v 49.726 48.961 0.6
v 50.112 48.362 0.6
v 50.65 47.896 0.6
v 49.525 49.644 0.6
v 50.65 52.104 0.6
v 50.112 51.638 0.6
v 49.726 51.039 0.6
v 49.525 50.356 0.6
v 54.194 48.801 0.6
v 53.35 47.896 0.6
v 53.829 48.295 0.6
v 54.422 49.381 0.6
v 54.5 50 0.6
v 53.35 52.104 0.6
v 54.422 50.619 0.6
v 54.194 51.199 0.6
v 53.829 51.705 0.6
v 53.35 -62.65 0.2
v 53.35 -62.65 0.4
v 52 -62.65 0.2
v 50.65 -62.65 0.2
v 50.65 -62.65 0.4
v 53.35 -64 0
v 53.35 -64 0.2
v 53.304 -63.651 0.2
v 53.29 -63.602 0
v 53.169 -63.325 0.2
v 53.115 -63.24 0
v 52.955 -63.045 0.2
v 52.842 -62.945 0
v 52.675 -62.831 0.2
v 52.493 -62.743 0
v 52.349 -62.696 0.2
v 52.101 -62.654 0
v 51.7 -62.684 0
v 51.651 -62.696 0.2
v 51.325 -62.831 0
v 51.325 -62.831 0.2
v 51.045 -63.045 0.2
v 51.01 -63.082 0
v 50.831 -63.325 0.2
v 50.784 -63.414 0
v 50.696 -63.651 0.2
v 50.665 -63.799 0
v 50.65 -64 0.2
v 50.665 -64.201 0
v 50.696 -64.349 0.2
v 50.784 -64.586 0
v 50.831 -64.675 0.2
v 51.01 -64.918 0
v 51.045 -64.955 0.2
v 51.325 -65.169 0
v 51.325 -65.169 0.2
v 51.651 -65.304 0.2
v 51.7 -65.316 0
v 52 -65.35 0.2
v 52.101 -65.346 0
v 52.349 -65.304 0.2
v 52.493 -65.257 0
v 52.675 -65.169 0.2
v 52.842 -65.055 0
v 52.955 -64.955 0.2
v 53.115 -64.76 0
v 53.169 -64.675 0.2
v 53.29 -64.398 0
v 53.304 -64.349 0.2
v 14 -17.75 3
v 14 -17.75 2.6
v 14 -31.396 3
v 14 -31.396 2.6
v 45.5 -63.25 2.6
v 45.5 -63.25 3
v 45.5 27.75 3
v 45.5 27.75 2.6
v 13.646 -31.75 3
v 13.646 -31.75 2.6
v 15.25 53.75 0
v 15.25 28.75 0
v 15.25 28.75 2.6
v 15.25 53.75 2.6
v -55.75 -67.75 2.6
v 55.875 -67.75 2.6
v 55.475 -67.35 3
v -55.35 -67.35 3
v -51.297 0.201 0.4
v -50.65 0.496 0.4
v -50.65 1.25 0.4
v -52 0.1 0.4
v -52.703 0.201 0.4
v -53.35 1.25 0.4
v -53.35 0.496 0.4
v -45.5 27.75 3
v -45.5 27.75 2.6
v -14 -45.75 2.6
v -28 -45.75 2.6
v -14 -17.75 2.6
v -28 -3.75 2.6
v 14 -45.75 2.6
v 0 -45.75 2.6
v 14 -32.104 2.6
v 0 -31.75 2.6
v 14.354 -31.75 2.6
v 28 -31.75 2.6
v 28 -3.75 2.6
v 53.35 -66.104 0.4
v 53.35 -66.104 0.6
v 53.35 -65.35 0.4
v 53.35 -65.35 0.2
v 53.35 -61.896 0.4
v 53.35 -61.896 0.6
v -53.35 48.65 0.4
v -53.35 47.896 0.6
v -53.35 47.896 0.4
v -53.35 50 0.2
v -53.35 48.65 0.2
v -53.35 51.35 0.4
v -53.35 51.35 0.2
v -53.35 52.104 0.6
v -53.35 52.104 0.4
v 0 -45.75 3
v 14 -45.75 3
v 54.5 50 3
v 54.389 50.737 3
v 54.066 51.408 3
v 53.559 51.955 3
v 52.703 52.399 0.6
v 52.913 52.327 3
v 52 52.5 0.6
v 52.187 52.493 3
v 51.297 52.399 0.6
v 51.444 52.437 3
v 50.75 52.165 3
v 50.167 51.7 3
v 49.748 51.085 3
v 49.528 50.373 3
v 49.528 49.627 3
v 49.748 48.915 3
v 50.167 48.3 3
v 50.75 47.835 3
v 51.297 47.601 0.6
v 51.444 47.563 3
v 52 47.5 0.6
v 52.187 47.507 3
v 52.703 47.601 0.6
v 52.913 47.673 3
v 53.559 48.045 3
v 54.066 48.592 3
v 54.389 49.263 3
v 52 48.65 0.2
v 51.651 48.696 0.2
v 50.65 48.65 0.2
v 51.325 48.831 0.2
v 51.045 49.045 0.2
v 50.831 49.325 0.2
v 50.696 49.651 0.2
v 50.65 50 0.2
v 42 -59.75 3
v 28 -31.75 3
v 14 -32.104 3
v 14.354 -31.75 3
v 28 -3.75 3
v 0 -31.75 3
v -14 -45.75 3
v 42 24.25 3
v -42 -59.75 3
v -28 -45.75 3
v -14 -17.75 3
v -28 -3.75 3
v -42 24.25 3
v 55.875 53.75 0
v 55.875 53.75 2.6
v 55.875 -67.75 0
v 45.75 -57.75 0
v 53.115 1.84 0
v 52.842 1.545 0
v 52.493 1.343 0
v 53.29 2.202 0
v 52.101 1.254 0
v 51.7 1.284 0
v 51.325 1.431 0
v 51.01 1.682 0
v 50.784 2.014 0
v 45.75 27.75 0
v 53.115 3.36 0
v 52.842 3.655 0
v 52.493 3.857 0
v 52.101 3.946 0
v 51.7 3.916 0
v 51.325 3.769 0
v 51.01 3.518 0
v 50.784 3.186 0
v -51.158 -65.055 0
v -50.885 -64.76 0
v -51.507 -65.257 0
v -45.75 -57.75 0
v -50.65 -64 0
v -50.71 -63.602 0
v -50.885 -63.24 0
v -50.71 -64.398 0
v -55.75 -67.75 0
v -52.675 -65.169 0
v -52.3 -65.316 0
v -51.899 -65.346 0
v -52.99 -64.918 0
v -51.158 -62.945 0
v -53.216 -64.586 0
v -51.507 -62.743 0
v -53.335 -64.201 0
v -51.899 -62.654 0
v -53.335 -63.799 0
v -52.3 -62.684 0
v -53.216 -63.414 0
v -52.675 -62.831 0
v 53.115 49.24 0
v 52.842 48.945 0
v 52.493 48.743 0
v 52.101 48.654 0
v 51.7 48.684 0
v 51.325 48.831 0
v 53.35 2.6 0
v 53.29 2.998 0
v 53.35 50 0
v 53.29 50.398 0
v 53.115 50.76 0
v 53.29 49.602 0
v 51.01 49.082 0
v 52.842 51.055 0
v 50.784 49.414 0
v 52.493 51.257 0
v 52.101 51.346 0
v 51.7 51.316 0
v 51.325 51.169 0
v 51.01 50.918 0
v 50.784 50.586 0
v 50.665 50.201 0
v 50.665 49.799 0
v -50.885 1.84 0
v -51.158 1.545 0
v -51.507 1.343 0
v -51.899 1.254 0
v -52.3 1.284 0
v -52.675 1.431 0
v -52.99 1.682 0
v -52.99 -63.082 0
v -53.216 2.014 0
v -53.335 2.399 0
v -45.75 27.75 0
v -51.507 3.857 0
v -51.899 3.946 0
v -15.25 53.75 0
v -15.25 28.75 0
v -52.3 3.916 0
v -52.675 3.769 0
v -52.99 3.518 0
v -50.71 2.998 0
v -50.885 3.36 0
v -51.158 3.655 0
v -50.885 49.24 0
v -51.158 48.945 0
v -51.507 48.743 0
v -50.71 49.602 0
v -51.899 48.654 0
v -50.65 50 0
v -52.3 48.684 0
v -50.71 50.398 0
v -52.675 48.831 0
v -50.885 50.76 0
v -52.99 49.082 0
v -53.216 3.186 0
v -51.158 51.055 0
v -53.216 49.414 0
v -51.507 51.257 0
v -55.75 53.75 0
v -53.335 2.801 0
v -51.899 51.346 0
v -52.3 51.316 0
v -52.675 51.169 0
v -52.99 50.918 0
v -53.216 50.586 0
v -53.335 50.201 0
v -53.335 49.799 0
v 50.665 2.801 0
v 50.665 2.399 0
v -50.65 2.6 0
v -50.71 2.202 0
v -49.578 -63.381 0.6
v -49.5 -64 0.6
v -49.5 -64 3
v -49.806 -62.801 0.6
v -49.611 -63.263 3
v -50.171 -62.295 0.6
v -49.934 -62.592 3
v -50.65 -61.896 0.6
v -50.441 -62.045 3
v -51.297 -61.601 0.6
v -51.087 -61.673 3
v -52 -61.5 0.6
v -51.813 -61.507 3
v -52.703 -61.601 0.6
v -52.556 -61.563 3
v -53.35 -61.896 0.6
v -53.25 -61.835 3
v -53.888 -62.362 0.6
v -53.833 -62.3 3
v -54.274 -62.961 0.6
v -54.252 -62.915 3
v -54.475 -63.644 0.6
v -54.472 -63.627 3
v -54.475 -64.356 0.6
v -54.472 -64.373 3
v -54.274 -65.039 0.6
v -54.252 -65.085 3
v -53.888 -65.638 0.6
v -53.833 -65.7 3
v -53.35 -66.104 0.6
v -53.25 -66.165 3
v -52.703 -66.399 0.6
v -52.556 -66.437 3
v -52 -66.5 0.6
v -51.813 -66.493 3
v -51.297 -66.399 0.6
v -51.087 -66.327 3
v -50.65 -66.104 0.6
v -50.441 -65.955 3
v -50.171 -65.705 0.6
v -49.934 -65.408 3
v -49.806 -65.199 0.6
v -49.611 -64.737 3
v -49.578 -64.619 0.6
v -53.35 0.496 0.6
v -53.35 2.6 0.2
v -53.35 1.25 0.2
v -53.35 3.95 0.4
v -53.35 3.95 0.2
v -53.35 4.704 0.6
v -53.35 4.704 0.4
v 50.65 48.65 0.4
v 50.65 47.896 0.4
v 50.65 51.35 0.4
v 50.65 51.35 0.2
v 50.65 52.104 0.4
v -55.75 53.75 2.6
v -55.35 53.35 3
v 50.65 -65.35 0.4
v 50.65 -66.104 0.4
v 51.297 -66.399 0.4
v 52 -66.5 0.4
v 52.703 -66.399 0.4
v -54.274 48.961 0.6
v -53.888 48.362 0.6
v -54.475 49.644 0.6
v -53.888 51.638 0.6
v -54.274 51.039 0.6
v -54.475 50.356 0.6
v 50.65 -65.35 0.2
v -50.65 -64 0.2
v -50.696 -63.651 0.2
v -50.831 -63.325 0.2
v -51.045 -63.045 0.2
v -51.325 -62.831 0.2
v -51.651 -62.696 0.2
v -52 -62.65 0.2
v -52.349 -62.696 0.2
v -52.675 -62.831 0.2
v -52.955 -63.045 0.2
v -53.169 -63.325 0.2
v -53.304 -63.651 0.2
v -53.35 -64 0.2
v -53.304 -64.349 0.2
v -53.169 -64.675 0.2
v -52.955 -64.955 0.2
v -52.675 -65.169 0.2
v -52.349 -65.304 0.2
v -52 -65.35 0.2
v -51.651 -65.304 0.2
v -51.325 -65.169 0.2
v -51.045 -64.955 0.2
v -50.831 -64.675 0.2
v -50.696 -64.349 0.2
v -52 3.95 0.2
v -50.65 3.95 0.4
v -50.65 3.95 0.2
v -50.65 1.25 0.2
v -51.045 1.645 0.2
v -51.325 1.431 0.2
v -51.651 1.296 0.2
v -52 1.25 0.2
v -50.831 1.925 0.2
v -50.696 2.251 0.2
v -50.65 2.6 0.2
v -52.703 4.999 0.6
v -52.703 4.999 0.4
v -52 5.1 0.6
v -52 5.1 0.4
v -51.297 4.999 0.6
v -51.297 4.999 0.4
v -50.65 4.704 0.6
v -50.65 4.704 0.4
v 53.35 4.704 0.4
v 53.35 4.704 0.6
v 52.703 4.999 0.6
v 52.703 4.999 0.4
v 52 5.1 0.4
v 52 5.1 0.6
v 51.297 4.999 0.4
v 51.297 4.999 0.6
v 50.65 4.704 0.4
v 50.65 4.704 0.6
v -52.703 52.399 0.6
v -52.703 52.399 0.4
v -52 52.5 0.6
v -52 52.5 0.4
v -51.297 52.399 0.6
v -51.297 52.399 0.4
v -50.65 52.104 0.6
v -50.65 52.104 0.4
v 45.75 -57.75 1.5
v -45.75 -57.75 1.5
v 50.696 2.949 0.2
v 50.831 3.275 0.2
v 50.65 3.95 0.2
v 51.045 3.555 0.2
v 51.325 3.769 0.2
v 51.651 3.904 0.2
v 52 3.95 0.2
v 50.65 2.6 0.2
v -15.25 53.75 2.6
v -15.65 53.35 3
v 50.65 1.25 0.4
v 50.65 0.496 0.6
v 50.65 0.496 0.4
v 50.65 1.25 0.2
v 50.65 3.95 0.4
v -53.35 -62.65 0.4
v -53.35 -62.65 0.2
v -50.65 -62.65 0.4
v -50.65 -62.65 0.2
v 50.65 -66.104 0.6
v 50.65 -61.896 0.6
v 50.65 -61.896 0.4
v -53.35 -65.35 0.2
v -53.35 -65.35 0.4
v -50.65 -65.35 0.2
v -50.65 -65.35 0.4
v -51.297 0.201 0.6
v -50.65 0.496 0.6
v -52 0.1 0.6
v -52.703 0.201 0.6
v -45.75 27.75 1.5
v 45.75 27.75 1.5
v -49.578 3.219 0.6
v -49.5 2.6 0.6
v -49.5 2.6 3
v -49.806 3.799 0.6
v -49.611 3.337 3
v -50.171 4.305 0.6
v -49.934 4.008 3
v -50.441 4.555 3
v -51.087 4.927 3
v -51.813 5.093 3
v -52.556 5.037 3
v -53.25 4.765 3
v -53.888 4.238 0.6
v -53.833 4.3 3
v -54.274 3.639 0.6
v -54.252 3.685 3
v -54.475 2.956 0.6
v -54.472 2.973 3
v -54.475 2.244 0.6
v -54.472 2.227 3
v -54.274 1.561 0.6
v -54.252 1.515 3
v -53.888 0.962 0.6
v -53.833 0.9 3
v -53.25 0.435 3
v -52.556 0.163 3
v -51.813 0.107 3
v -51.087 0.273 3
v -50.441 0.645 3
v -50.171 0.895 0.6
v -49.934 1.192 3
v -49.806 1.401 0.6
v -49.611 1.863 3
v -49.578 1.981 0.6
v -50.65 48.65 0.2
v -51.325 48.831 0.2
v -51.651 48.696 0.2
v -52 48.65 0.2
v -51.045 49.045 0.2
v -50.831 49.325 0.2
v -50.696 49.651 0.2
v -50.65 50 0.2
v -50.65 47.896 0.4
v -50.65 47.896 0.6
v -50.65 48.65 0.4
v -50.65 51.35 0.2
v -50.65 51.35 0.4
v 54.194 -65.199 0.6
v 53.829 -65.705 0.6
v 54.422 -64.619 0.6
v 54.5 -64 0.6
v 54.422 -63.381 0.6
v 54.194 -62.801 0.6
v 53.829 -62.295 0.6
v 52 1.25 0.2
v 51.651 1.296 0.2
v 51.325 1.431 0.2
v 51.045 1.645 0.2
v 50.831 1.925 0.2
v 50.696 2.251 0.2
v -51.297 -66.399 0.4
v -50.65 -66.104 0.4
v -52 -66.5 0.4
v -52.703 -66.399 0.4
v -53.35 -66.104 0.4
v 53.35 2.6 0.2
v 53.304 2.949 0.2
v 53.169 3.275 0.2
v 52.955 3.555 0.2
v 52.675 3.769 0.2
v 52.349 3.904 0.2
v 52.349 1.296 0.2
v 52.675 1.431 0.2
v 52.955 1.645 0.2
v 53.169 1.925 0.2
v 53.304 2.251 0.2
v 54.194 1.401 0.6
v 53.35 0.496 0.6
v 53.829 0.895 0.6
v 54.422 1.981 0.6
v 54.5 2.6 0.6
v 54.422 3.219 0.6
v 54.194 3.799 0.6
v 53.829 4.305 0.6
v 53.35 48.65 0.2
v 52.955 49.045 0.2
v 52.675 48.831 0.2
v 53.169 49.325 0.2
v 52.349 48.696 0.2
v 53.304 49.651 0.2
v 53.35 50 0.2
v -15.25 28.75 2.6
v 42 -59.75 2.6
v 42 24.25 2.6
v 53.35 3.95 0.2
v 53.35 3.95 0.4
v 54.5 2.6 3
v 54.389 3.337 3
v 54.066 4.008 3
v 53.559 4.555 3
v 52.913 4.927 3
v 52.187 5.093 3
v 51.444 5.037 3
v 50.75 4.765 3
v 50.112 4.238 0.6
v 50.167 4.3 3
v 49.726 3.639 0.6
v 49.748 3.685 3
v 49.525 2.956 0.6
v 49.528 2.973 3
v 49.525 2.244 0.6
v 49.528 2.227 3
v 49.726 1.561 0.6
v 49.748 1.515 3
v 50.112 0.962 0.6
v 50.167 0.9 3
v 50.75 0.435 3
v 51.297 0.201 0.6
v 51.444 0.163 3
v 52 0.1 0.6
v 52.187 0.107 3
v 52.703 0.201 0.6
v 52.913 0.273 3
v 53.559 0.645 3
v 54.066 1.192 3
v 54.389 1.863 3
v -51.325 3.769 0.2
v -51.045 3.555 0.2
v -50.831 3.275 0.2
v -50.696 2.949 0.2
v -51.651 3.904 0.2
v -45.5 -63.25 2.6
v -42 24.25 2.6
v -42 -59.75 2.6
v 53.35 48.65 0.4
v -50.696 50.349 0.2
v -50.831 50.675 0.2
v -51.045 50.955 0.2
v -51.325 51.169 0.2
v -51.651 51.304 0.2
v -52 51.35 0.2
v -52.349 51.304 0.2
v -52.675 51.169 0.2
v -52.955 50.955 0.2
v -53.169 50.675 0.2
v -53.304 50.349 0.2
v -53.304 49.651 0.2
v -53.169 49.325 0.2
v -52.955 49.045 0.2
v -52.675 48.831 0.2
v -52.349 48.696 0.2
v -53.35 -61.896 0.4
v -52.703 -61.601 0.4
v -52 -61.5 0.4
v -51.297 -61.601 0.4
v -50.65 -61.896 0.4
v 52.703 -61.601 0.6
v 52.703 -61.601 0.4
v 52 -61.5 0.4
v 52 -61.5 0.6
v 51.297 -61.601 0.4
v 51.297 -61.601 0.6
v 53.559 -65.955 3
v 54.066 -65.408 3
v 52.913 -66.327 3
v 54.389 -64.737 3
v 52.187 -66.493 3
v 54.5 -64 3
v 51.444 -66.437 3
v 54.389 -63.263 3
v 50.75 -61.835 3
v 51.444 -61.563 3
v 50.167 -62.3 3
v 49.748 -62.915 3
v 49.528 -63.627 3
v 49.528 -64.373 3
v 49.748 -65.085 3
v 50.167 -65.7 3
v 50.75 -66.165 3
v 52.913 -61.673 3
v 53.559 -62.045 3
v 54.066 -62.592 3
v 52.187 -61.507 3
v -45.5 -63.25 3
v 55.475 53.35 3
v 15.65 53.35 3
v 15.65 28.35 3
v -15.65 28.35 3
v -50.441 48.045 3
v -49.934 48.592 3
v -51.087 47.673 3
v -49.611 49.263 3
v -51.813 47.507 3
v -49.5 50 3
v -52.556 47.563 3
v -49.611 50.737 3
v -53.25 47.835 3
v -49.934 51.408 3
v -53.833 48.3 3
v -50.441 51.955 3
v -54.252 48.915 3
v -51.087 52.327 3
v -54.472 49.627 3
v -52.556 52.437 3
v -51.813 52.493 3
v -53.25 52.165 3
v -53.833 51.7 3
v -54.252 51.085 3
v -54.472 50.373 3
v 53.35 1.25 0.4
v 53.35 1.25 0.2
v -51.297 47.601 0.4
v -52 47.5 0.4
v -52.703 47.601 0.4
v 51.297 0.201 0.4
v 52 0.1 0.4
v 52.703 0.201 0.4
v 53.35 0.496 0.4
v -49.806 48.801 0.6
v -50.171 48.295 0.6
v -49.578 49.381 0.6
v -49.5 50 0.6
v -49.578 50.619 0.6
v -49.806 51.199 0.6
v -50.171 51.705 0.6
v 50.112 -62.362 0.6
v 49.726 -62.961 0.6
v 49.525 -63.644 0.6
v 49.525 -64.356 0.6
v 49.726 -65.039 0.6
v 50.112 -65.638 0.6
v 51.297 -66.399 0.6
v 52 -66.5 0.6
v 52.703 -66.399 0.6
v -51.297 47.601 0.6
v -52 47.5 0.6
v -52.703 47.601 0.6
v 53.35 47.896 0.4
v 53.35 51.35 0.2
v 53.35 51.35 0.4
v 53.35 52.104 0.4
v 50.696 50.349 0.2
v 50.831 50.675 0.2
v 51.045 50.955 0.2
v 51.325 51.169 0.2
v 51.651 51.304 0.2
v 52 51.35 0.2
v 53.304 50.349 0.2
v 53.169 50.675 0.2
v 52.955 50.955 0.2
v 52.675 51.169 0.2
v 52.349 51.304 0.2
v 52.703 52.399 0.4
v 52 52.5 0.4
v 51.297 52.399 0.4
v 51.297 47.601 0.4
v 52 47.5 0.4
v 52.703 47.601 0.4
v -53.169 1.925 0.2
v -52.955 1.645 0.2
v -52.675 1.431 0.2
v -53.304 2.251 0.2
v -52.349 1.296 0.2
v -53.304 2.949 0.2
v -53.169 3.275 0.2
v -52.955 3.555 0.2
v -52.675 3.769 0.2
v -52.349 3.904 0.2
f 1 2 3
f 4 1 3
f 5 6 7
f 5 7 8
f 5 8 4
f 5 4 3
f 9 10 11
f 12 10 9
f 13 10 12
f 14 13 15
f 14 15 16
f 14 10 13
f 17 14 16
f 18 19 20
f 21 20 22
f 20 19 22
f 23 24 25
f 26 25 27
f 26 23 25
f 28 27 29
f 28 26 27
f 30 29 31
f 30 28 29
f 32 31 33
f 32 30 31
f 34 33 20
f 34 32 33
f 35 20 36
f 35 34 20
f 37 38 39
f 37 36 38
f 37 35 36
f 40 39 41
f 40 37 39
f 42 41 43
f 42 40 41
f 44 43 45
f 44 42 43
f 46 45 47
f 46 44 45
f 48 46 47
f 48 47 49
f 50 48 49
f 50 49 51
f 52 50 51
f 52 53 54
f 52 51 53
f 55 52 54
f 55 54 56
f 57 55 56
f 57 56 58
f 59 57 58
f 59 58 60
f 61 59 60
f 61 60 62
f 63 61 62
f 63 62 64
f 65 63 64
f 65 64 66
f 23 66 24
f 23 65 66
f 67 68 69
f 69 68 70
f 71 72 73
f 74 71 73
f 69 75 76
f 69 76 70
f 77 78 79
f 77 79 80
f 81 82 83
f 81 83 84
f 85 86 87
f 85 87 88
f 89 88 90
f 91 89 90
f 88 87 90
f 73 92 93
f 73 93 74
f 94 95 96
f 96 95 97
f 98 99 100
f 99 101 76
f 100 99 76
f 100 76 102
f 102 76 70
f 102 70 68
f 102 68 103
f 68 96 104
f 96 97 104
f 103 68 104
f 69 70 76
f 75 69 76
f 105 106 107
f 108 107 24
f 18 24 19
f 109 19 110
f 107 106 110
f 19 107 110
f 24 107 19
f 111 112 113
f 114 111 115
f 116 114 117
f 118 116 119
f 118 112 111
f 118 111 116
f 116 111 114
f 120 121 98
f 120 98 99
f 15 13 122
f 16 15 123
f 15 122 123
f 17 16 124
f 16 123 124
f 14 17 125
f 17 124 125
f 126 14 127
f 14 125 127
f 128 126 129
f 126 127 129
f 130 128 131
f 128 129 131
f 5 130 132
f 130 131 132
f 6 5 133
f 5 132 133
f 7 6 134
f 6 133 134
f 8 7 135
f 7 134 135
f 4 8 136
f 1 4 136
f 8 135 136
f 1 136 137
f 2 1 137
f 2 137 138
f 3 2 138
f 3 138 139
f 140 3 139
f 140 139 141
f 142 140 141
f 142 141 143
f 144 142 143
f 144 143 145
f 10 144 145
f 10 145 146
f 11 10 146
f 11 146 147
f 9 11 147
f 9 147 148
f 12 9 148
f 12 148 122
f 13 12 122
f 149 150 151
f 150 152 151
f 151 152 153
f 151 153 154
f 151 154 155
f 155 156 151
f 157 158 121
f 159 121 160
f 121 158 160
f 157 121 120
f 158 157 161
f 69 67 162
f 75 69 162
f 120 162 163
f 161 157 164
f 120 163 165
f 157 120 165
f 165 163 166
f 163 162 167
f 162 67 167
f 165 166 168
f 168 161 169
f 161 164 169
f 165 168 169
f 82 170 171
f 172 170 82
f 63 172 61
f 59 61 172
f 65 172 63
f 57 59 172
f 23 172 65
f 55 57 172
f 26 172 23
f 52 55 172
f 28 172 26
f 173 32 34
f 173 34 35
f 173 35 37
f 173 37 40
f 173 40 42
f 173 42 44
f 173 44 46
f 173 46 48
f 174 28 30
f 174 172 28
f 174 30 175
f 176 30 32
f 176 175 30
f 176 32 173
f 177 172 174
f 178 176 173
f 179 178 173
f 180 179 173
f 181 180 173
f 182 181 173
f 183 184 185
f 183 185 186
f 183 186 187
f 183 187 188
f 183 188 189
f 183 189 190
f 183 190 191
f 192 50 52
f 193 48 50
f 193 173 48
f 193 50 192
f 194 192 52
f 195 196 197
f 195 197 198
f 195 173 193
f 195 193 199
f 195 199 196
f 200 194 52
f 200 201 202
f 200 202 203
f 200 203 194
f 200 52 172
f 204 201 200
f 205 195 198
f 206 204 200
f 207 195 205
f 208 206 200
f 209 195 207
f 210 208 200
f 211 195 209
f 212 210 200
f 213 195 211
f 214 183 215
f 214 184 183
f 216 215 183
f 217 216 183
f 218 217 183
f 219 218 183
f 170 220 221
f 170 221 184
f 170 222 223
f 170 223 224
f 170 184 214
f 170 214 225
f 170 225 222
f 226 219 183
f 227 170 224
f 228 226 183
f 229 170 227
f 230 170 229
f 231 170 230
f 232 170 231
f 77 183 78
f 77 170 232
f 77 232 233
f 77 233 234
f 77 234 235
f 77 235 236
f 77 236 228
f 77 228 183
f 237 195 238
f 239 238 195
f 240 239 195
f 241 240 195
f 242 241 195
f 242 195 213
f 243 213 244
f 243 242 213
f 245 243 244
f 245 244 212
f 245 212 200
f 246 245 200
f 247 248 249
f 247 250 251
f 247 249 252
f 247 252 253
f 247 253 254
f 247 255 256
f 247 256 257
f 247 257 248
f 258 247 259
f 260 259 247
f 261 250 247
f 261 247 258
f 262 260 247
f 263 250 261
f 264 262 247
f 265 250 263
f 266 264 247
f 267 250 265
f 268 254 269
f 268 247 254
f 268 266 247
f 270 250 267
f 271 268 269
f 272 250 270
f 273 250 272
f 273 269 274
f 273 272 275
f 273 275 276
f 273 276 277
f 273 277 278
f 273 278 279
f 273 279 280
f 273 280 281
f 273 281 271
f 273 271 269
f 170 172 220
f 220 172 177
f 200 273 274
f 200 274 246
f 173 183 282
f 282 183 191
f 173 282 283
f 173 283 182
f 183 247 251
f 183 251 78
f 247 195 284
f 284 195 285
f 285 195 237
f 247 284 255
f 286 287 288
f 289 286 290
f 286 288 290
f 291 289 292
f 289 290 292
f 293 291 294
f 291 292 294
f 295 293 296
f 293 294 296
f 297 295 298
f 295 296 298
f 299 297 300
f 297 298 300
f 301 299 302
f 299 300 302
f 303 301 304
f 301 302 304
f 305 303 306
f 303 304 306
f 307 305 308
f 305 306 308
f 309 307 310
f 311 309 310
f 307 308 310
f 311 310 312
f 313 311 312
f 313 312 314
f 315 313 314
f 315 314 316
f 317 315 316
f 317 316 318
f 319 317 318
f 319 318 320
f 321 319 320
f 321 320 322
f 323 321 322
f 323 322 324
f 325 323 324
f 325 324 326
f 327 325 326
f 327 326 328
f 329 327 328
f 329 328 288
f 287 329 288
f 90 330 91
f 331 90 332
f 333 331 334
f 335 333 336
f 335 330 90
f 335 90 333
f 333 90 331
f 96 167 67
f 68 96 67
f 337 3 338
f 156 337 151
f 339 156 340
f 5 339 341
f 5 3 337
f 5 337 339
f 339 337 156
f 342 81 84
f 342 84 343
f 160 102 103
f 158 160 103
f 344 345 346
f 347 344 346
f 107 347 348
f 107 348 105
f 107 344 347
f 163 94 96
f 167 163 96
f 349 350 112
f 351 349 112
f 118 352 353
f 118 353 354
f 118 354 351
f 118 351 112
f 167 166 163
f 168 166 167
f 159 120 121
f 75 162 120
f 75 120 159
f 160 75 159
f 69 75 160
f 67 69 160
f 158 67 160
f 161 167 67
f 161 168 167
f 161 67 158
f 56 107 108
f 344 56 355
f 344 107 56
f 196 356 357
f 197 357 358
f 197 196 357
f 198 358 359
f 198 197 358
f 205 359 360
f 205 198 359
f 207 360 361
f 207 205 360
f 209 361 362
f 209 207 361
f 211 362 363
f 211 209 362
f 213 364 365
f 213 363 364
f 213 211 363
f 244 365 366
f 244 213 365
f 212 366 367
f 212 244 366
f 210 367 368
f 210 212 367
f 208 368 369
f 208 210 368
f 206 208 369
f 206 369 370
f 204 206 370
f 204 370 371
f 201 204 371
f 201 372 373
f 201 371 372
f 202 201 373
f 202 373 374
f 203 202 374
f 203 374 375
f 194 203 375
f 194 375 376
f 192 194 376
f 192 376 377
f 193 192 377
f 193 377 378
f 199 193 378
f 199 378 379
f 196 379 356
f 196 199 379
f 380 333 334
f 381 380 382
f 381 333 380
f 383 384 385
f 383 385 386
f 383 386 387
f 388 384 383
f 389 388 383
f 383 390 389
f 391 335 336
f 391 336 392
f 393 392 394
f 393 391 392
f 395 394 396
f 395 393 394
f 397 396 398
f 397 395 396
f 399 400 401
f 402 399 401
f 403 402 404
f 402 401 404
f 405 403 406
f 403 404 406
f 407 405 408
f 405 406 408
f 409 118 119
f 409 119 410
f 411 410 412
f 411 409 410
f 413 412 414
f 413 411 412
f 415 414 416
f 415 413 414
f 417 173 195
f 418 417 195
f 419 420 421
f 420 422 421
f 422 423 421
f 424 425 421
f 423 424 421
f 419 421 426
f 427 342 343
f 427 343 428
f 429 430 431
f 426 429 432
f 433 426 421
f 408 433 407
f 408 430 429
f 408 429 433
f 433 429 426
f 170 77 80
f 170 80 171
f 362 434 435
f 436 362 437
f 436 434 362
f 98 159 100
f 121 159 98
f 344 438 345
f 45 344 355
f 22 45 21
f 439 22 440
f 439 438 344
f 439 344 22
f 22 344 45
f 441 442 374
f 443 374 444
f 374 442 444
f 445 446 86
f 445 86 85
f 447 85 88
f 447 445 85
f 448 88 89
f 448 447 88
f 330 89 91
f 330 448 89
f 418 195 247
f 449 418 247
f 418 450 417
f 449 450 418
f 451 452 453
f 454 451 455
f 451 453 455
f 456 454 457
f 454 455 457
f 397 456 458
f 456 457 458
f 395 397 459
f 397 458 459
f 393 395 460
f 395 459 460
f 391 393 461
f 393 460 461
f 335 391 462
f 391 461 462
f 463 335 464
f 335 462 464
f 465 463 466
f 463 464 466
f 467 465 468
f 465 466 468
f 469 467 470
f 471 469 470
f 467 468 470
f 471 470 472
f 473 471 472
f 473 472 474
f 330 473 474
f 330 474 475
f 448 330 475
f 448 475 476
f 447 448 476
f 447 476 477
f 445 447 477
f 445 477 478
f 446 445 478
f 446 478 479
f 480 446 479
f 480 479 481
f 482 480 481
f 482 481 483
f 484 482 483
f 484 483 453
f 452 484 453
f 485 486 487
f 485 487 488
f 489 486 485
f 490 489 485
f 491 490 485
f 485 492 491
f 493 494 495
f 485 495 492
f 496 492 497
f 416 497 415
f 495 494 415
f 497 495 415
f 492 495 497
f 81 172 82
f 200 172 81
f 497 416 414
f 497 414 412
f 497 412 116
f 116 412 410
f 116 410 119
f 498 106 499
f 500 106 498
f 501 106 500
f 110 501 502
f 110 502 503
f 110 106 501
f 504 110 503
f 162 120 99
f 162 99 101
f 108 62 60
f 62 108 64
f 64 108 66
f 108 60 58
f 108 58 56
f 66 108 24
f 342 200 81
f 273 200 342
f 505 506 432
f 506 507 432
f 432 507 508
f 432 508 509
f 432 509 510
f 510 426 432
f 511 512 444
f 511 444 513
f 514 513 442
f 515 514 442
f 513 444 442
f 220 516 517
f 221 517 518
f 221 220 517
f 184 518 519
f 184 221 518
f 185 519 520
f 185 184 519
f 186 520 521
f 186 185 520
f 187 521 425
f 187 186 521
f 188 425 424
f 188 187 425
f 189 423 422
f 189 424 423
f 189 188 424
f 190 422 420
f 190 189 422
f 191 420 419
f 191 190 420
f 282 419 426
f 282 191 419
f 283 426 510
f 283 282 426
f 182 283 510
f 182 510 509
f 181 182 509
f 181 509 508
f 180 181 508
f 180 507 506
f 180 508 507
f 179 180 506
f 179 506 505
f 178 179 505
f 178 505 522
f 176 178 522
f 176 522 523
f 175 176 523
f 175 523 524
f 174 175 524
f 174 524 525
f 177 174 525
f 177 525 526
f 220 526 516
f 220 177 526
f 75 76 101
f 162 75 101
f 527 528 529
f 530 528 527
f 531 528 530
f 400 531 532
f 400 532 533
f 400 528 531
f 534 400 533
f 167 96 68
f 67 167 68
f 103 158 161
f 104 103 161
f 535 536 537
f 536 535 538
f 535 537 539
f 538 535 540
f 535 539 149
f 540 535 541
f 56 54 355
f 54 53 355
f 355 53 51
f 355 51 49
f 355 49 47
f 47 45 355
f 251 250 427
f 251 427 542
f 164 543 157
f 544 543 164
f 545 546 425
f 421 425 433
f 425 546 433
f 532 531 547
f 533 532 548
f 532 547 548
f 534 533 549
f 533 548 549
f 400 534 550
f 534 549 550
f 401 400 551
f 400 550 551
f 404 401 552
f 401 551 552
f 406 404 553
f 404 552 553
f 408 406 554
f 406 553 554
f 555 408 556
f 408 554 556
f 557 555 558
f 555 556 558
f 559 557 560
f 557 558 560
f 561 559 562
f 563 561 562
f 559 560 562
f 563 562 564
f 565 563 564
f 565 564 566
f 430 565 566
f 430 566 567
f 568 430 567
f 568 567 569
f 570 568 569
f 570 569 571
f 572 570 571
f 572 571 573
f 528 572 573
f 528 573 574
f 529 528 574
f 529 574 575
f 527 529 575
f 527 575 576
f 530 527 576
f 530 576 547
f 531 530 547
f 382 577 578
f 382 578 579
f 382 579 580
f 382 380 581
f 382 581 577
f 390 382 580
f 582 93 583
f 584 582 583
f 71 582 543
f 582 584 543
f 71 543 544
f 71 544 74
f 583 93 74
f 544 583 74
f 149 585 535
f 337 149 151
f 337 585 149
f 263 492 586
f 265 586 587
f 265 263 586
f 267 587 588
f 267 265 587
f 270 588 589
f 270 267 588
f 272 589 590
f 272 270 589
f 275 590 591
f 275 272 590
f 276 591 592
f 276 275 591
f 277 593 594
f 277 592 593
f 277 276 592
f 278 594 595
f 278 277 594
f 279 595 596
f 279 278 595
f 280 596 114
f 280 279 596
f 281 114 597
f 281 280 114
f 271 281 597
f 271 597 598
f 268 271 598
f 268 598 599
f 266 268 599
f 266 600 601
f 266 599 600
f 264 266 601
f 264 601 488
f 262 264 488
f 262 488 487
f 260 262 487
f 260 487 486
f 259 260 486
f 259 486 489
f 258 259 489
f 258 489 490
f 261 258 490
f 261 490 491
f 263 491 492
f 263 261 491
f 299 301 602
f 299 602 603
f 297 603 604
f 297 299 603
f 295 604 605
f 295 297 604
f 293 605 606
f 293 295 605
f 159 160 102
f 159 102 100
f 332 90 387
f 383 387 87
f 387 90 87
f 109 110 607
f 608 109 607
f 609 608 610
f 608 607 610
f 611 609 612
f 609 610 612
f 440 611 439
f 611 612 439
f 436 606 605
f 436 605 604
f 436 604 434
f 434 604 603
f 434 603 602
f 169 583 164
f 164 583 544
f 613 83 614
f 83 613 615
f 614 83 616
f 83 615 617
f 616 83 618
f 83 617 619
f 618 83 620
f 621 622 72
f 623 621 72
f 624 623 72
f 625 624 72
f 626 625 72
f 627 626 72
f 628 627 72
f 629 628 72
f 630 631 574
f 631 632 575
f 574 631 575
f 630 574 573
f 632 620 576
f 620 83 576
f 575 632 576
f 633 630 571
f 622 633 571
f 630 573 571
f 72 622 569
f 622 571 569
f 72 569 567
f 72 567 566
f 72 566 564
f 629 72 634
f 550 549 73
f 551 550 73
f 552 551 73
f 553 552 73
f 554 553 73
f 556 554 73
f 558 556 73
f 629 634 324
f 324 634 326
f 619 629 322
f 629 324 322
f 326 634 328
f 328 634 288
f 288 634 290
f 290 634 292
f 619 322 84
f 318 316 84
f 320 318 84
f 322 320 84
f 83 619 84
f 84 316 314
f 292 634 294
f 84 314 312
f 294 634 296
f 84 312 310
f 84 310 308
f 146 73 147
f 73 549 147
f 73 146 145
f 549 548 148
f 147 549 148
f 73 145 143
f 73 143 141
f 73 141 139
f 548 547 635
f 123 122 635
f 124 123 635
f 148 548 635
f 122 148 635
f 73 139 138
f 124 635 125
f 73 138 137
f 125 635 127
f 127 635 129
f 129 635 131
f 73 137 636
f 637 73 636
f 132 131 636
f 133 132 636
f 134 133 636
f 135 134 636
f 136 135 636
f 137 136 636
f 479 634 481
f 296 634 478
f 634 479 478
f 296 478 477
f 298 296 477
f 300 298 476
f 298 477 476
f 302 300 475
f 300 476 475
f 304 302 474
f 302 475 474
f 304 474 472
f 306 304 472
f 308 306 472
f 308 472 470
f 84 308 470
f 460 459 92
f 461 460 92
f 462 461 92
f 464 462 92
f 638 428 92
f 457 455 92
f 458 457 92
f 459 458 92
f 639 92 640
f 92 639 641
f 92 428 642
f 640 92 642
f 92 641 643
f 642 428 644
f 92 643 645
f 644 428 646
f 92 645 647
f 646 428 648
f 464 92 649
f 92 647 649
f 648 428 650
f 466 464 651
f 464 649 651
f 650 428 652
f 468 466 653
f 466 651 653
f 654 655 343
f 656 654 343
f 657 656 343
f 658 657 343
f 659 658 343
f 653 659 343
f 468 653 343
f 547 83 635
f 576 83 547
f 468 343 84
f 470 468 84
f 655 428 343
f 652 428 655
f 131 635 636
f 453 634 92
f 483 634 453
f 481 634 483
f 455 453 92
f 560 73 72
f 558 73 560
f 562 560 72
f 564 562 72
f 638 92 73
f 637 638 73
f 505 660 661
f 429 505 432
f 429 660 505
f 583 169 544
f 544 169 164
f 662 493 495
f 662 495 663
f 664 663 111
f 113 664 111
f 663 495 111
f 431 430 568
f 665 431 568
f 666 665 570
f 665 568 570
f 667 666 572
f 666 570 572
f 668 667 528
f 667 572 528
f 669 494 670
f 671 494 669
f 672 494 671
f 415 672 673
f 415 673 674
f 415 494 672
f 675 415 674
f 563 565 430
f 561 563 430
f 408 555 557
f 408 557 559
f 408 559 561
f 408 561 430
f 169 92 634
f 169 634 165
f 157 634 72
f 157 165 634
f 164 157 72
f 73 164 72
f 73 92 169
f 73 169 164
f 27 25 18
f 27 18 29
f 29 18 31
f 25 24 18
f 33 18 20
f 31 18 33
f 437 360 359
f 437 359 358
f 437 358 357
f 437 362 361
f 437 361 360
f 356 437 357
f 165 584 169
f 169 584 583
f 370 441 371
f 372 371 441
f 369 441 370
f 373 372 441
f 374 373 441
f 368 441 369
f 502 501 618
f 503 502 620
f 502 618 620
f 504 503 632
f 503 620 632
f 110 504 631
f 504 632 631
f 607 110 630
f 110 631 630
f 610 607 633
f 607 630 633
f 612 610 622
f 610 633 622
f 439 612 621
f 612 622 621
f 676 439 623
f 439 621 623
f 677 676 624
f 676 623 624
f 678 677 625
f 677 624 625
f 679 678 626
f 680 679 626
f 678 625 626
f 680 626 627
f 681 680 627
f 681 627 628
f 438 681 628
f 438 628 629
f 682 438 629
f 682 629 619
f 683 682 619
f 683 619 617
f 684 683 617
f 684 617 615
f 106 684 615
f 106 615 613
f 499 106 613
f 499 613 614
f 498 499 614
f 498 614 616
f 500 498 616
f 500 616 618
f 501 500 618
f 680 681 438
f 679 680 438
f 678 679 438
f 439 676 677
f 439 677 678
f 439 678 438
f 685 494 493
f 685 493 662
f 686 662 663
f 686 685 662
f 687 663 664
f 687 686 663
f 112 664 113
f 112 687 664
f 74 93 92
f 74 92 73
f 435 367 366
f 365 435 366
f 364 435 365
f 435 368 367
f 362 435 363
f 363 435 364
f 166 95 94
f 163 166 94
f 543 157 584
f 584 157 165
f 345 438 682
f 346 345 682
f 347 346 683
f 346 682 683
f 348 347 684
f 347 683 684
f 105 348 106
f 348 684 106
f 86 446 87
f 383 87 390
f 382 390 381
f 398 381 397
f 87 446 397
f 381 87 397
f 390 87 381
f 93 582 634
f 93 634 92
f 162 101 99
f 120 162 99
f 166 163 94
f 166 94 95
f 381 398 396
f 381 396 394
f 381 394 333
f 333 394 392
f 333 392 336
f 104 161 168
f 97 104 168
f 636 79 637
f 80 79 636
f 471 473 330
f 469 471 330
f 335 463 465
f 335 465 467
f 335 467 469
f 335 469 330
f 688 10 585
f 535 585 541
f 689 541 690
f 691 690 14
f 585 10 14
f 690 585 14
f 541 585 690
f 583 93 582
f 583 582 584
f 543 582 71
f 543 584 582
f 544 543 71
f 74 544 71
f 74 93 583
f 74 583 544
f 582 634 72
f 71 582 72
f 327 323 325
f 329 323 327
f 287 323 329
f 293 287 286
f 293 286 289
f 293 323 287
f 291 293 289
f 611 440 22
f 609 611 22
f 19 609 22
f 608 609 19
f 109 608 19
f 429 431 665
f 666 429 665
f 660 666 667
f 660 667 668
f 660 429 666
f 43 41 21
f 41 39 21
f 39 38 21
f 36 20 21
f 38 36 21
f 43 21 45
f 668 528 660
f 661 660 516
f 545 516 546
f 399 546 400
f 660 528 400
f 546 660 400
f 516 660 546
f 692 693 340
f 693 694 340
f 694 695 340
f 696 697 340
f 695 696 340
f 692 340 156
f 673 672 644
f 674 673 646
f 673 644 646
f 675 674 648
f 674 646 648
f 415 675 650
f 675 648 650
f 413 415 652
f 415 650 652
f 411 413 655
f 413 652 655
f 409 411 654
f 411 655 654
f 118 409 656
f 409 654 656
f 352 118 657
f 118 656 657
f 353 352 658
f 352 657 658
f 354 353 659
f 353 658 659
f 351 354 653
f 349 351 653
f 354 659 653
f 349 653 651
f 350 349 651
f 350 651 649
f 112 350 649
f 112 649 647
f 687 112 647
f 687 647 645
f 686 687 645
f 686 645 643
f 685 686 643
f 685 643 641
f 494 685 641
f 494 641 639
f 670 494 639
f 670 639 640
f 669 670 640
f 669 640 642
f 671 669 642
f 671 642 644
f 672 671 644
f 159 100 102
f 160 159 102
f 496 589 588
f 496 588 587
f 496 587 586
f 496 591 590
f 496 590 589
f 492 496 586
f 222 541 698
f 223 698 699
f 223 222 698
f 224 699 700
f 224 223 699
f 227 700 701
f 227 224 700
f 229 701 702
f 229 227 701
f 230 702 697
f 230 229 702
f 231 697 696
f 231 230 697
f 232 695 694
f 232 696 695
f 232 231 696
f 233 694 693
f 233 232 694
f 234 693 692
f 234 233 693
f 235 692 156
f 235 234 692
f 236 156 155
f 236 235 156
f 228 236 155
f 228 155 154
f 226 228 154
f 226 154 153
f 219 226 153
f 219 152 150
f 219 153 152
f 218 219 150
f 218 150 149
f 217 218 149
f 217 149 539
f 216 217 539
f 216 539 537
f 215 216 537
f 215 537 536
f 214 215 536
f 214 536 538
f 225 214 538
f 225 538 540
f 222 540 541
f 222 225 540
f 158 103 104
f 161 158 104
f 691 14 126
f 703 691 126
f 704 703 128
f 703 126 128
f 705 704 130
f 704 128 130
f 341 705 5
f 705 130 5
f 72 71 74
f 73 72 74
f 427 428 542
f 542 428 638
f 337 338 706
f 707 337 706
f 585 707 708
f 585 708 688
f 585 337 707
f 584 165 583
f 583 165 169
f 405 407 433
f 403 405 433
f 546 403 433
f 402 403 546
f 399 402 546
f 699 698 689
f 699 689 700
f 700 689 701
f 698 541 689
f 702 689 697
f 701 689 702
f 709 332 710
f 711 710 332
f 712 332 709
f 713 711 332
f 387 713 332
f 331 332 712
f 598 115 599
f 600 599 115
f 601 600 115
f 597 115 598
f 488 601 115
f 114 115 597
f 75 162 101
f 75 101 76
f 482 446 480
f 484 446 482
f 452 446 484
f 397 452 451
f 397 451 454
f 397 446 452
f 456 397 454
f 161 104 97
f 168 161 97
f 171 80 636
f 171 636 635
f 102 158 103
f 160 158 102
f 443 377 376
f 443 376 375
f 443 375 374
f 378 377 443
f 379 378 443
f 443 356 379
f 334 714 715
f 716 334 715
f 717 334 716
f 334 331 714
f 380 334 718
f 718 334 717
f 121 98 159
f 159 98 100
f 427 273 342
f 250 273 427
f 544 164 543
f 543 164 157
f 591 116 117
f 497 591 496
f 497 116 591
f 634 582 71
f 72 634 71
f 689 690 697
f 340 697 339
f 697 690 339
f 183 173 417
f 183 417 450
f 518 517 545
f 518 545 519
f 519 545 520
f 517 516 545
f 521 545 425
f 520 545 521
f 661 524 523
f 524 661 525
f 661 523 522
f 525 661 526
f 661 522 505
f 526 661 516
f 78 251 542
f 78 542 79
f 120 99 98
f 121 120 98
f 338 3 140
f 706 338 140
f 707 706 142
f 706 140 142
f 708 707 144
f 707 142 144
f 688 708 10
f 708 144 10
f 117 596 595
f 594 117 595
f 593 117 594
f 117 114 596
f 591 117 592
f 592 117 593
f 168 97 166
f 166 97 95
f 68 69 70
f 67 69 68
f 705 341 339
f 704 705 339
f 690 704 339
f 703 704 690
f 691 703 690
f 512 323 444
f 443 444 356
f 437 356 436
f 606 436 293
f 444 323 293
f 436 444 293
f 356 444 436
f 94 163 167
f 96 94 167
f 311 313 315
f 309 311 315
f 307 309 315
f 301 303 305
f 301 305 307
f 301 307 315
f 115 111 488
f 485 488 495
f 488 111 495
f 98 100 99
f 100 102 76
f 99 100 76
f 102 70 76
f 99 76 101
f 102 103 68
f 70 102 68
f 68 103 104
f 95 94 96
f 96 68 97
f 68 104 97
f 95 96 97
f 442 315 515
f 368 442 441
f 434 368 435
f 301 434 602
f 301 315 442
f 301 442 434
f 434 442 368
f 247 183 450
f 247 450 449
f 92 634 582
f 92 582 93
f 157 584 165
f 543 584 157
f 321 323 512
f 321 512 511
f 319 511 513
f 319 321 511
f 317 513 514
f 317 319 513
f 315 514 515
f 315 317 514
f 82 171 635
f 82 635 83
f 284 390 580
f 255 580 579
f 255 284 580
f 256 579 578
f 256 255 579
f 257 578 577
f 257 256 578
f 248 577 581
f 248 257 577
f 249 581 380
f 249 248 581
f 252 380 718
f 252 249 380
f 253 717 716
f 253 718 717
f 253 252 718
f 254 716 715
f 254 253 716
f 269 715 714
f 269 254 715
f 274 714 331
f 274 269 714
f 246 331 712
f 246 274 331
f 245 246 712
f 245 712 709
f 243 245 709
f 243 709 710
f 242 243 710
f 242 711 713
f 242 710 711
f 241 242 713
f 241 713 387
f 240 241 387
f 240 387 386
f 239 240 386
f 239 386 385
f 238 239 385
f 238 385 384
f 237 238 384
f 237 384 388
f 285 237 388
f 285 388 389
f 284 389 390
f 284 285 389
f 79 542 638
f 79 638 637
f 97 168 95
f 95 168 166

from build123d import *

# Parameters (mm, degrees)
SKETCH1_R           = 1.35
BOSS_EXTRUDE1_DEPTH = 3
SKETCH3_R           = 2.5
CUT_EXTRUDE1_DEPTH  = 2.4
SKETCH4_W           = 91.5
SKETCH4_H           = 85.5
CUT_EXTRUDE2_DEPTH  = 1.5
CUT_EXTRUDE3_DEPTH  = 0.2
SKETCH6_W           = 2.7
SKETCH6_H           = 2.7
CUT_EXTRUDE4_DEPTH  = 0.2
CHAMFER1_SIZE       = 0.4
SKETCH7_W           = 91
SKETCH7_H           = 91
CUT_EXTRUDE5_DEPTH  = 0.4
SKETCH8_W           = 91
SKETCH8_H           = 91
SKETCH8_W_2         = 84
SKETCH8_H_2         = 84
BOSS_EXTRUDE2_DEPTH = 0.4
CUT_EXTRUDE6_DEPTH  = 0.4
BOSS_EXTRUDE3_DEPTH = 0.4


with BuildPart() as part:
    # Sketch1 → Boss-Extrude1 (new body)
    with BuildSketch(Plane.XY):
        Polygon((-15.25, 53.75), (-15.25, 28.75), (15.25, 28.75), (15.25, 53.75), (55.875, 53.75), (55.875, -67.75), (-55.75, -67.75), (-55.75, 53.75), align=None)
        with Locations((-52, 50)):
            Circle(SKETCH1_R, mode=Mode.SUBTRACT)
        with Locations((-52, 2.6)):
            Circle(SKETCH1_R, mode=Mode.SUBTRACT)
        with Locations((-52, -64)):
            Circle(SKETCH1_R, mode=Mode.SUBTRACT)
        with Locations((52, 50)):
            Circle(SKETCH1_R, mode=Mode.SUBTRACT)
        with Locations((52, 2.6)):
            Circle(SKETCH1_R, mode=Mode.SUBTRACT)
        with Locations((52, -64)):
            Circle(SKETCH1_R, mode=Mode.SUBTRACT)
    extrude(amount=BOSS_EXTRUDE1_DEPTH)

    # Sketch3 → Cut-Extrude1 (cut)
    with BuildSketch(Plane.XY.offset(3)):
        with Locations((-52, 50)):
            Circle(SKETCH3_R)
        with Locations((-52, 2.6)):
            Circle(SKETCH3_R)
        with Locations((-52, -64)):
            Circle(SKETCH3_R)
        with Locations((52, -64)):
            Circle(SKETCH3_R)
        with Locations((52, 2.6)):
            Circle(SKETCH3_R)
        with Locations((52, 50)):
            Circle(SKETCH3_R)
    extrude(amount=-CUT_EXTRUDE1_DEPTH, mode=Mode.SUBTRACT)

    # Sketch4 → Cut-Extrude2 (cut)
    with BuildSketch(Plane(origin=(0, 0, 0), x_dir=(-1, 0, 0), z_dir=(0, 0, -1))):
        with Locations((0, -15)):
            Rectangle(SKETCH4_W, SKETCH4_H)
    extrude(amount=-CUT_EXTRUDE2_DEPTH, mode=Mode.SUBTRACT)

    # Sketch5 → Cut-Extrude3 (cut)
    with BuildSketch(Plane.XY.offset(0.6)):
        with BuildLine():
            Line((-53.35, 47.895837459), (-53.35, 52.104162541))
            ThreePointArc((-53.35, 52.104162541), (-52, 52.5), (-50.65, 52.104162541))
            Line((-50.65, 52.104162541), (-50.65, 47.895837459))
            ThreePointArc((-50.65, 47.895837459), (-52, 47.5), (-53.35, 47.895837459))
        make_face()
        with BuildLine():
            Line((-53.35, 0.495837459), (-53.35, 4.704162541))
            ThreePointArc((-53.35, 4.704162541), (-52, 5.1), (-50.65, 4.704162541))
            Line((-50.65, 4.704162541), (-50.65, 0.495837459))
            ThreePointArc((-50.65, 0.495837459), (-52, 0.1), (-53.35, 0.495837459))
        make_face()
        with BuildLine():
            Line((-53.35, -66.104162541), (-53.35, -61.895837459))
            ThreePointArc((-53.35, -61.895837459), (-52, -61.5), (-50.65, -61.895837459))
            Line((-50.65, -61.895837459), (-50.65, -66.104162541))
            ThreePointArc((-50.65, -66.104162541), (-52, -66.5), (-53.35, -66.104162541))
        make_face()
    cut_extrude3 = extrude(amount=-CUT_EXTRUDE3_DEPTH, mode=Mode.SUBTRACT)

    # Sketch6 → Cut-Extrude4 (cut)
    with BuildSketch(Plane.XY.offset(0.4)):
        with Locations((-52, -64)):
            Rectangle(SKETCH6_W, SKETCH6_H)
        with Locations((-52, 2.6)):
            Rectangle(SKETCH6_W, SKETCH6_H)
        with Locations((-52, 50)):
            Rectangle(SKETCH6_W, SKETCH6_H)
    cut_extrude4 = extrude(amount=-CUT_EXTRUDE4_DEPTH, mode=Mode.SUBTRACT)

    # Mirror1: Cut-Extrude3, Cut-Extrude4 across plane
    add(cut_extrude3.mirror(Plane(origin=(0, 0, 0), x_dir=(0, 0, 1), z_dir=(1, 0, 0))), mode=Mode.SUBTRACT)
    add(cut_extrude4.mirror(Plane(origin=(0, 0, 0), x_dir=(0, 0, 1), z_dir=(1, 0, 0))), mode=Mode.SUBTRACT)

    # Chamfer1
    chamfer1_edges = [part.edges().sort_by_distance(p)[0] for p in [
        (55.875, -7, 3),
        (35.5625, 53.75, 3),
        (15.25, 41.25, 3),
        (0, 28.75, 3),
        (-15.25, 41.25, 3),
        (-35.5, 53.75, 3),
        (-55.75, -7, 3),
        (0.0625, -67.75, 3),
    ]]
    chamfer(chamfer1_edges, length=CHAMFER1_SIZE)

    # Sketch7 → Cut-Extrude5 (cut)
    with BuildSketch(Plane.XY.offset(3)):
        with Locations((0, -17.75)):
            Rectangle(SKETCH7_W, SKETCH7_H)
        Polygon((28, 24.25), (42, 24.25), (42, 10.25), (42, -3.75), (42, -17.75), (42, -31.75), (42, -45.75), (42, -59.75), (28, -59.75), (14, -59.75), (0, -59.75), (-14, -59.75), (-28, -59.75), (-42, -59.75), (-42, -45.75), (-42, -31.75), (-42, -17.75), (-42, -3.75), (-42, 10.25), (-42, 24.25), (-28, 24.25), (-14, 24.25), (0, 24.25), (14, 24.25), align=None, mode=Mode.SUBTRACT)
    extrude(amount=-CUT_EXTRUDE5_DEPTH, mode=Mode.SUBTRACT)

    # Sketch9 → Cut-Extrude6 (cut)
    with BuildSketch(Plane.XY.offset(3)):
        Polygon((0, -45.75), (0, -31.75), (13.646446609, -31.75), (14, -31.396446609), (14, -17.75), (0, -17.75), (-14, -17.75), (-14, -31.75), (-14, -45.75), (-28, -45.75), (-28, -31.75), (-28, -17.75), (-28, -3.75), (-14, -3.75), (0, -3.75), (14, -3.75), (28, -3.75), (28, -17.75), (28, -31.75), (14.353553391, -31.75), (14, -32.103553391), (14, -45.75), align=None)
    extrude(amount=-CUT_EXTRUDE6_DEPTH, mode=Mode.SUBTRACT)


with BuildPart() as body_2:
    # Sketch8 → Boss-Extrude2 (new body)
    with BuildSketch(Plane.XY.offset(2.6)):
        with Locations((0, -17.75)):
            Rectangle(SKETCH8_W, SKETCH8_H)
        with Locations((0, -17.75)):
            Rectangle(SKETCH8_W_2, SKETCH8_H_2, mode=Mode.SUBTRACT)
    extrude(amount=BOSS_EXTRUDE2_DEPTH)


with BuildPart() as body_3:
    # Sketch10 → Boss-Extrude3 (new body)
    with BuildSketch(Plane.XY.offset(2.6)):
        Polygon((14, -32.103553391), (14.353553391, -31.75), (28, -31.75), (28, -3.75), (-28, -3.75), (-28, -45.75), (-14, -45.75), (-14, -17.75), (14, -17.75), (14, -31.396446609), (13.646446609, -31.75), (0, -31.75), (0, -45.75), (14, -45.75), align=None)
    extrude(amount=BOSS_EXTRUDE3_DEPTH)


solid = Compound([part.part, body_2.part, body_3.part])
